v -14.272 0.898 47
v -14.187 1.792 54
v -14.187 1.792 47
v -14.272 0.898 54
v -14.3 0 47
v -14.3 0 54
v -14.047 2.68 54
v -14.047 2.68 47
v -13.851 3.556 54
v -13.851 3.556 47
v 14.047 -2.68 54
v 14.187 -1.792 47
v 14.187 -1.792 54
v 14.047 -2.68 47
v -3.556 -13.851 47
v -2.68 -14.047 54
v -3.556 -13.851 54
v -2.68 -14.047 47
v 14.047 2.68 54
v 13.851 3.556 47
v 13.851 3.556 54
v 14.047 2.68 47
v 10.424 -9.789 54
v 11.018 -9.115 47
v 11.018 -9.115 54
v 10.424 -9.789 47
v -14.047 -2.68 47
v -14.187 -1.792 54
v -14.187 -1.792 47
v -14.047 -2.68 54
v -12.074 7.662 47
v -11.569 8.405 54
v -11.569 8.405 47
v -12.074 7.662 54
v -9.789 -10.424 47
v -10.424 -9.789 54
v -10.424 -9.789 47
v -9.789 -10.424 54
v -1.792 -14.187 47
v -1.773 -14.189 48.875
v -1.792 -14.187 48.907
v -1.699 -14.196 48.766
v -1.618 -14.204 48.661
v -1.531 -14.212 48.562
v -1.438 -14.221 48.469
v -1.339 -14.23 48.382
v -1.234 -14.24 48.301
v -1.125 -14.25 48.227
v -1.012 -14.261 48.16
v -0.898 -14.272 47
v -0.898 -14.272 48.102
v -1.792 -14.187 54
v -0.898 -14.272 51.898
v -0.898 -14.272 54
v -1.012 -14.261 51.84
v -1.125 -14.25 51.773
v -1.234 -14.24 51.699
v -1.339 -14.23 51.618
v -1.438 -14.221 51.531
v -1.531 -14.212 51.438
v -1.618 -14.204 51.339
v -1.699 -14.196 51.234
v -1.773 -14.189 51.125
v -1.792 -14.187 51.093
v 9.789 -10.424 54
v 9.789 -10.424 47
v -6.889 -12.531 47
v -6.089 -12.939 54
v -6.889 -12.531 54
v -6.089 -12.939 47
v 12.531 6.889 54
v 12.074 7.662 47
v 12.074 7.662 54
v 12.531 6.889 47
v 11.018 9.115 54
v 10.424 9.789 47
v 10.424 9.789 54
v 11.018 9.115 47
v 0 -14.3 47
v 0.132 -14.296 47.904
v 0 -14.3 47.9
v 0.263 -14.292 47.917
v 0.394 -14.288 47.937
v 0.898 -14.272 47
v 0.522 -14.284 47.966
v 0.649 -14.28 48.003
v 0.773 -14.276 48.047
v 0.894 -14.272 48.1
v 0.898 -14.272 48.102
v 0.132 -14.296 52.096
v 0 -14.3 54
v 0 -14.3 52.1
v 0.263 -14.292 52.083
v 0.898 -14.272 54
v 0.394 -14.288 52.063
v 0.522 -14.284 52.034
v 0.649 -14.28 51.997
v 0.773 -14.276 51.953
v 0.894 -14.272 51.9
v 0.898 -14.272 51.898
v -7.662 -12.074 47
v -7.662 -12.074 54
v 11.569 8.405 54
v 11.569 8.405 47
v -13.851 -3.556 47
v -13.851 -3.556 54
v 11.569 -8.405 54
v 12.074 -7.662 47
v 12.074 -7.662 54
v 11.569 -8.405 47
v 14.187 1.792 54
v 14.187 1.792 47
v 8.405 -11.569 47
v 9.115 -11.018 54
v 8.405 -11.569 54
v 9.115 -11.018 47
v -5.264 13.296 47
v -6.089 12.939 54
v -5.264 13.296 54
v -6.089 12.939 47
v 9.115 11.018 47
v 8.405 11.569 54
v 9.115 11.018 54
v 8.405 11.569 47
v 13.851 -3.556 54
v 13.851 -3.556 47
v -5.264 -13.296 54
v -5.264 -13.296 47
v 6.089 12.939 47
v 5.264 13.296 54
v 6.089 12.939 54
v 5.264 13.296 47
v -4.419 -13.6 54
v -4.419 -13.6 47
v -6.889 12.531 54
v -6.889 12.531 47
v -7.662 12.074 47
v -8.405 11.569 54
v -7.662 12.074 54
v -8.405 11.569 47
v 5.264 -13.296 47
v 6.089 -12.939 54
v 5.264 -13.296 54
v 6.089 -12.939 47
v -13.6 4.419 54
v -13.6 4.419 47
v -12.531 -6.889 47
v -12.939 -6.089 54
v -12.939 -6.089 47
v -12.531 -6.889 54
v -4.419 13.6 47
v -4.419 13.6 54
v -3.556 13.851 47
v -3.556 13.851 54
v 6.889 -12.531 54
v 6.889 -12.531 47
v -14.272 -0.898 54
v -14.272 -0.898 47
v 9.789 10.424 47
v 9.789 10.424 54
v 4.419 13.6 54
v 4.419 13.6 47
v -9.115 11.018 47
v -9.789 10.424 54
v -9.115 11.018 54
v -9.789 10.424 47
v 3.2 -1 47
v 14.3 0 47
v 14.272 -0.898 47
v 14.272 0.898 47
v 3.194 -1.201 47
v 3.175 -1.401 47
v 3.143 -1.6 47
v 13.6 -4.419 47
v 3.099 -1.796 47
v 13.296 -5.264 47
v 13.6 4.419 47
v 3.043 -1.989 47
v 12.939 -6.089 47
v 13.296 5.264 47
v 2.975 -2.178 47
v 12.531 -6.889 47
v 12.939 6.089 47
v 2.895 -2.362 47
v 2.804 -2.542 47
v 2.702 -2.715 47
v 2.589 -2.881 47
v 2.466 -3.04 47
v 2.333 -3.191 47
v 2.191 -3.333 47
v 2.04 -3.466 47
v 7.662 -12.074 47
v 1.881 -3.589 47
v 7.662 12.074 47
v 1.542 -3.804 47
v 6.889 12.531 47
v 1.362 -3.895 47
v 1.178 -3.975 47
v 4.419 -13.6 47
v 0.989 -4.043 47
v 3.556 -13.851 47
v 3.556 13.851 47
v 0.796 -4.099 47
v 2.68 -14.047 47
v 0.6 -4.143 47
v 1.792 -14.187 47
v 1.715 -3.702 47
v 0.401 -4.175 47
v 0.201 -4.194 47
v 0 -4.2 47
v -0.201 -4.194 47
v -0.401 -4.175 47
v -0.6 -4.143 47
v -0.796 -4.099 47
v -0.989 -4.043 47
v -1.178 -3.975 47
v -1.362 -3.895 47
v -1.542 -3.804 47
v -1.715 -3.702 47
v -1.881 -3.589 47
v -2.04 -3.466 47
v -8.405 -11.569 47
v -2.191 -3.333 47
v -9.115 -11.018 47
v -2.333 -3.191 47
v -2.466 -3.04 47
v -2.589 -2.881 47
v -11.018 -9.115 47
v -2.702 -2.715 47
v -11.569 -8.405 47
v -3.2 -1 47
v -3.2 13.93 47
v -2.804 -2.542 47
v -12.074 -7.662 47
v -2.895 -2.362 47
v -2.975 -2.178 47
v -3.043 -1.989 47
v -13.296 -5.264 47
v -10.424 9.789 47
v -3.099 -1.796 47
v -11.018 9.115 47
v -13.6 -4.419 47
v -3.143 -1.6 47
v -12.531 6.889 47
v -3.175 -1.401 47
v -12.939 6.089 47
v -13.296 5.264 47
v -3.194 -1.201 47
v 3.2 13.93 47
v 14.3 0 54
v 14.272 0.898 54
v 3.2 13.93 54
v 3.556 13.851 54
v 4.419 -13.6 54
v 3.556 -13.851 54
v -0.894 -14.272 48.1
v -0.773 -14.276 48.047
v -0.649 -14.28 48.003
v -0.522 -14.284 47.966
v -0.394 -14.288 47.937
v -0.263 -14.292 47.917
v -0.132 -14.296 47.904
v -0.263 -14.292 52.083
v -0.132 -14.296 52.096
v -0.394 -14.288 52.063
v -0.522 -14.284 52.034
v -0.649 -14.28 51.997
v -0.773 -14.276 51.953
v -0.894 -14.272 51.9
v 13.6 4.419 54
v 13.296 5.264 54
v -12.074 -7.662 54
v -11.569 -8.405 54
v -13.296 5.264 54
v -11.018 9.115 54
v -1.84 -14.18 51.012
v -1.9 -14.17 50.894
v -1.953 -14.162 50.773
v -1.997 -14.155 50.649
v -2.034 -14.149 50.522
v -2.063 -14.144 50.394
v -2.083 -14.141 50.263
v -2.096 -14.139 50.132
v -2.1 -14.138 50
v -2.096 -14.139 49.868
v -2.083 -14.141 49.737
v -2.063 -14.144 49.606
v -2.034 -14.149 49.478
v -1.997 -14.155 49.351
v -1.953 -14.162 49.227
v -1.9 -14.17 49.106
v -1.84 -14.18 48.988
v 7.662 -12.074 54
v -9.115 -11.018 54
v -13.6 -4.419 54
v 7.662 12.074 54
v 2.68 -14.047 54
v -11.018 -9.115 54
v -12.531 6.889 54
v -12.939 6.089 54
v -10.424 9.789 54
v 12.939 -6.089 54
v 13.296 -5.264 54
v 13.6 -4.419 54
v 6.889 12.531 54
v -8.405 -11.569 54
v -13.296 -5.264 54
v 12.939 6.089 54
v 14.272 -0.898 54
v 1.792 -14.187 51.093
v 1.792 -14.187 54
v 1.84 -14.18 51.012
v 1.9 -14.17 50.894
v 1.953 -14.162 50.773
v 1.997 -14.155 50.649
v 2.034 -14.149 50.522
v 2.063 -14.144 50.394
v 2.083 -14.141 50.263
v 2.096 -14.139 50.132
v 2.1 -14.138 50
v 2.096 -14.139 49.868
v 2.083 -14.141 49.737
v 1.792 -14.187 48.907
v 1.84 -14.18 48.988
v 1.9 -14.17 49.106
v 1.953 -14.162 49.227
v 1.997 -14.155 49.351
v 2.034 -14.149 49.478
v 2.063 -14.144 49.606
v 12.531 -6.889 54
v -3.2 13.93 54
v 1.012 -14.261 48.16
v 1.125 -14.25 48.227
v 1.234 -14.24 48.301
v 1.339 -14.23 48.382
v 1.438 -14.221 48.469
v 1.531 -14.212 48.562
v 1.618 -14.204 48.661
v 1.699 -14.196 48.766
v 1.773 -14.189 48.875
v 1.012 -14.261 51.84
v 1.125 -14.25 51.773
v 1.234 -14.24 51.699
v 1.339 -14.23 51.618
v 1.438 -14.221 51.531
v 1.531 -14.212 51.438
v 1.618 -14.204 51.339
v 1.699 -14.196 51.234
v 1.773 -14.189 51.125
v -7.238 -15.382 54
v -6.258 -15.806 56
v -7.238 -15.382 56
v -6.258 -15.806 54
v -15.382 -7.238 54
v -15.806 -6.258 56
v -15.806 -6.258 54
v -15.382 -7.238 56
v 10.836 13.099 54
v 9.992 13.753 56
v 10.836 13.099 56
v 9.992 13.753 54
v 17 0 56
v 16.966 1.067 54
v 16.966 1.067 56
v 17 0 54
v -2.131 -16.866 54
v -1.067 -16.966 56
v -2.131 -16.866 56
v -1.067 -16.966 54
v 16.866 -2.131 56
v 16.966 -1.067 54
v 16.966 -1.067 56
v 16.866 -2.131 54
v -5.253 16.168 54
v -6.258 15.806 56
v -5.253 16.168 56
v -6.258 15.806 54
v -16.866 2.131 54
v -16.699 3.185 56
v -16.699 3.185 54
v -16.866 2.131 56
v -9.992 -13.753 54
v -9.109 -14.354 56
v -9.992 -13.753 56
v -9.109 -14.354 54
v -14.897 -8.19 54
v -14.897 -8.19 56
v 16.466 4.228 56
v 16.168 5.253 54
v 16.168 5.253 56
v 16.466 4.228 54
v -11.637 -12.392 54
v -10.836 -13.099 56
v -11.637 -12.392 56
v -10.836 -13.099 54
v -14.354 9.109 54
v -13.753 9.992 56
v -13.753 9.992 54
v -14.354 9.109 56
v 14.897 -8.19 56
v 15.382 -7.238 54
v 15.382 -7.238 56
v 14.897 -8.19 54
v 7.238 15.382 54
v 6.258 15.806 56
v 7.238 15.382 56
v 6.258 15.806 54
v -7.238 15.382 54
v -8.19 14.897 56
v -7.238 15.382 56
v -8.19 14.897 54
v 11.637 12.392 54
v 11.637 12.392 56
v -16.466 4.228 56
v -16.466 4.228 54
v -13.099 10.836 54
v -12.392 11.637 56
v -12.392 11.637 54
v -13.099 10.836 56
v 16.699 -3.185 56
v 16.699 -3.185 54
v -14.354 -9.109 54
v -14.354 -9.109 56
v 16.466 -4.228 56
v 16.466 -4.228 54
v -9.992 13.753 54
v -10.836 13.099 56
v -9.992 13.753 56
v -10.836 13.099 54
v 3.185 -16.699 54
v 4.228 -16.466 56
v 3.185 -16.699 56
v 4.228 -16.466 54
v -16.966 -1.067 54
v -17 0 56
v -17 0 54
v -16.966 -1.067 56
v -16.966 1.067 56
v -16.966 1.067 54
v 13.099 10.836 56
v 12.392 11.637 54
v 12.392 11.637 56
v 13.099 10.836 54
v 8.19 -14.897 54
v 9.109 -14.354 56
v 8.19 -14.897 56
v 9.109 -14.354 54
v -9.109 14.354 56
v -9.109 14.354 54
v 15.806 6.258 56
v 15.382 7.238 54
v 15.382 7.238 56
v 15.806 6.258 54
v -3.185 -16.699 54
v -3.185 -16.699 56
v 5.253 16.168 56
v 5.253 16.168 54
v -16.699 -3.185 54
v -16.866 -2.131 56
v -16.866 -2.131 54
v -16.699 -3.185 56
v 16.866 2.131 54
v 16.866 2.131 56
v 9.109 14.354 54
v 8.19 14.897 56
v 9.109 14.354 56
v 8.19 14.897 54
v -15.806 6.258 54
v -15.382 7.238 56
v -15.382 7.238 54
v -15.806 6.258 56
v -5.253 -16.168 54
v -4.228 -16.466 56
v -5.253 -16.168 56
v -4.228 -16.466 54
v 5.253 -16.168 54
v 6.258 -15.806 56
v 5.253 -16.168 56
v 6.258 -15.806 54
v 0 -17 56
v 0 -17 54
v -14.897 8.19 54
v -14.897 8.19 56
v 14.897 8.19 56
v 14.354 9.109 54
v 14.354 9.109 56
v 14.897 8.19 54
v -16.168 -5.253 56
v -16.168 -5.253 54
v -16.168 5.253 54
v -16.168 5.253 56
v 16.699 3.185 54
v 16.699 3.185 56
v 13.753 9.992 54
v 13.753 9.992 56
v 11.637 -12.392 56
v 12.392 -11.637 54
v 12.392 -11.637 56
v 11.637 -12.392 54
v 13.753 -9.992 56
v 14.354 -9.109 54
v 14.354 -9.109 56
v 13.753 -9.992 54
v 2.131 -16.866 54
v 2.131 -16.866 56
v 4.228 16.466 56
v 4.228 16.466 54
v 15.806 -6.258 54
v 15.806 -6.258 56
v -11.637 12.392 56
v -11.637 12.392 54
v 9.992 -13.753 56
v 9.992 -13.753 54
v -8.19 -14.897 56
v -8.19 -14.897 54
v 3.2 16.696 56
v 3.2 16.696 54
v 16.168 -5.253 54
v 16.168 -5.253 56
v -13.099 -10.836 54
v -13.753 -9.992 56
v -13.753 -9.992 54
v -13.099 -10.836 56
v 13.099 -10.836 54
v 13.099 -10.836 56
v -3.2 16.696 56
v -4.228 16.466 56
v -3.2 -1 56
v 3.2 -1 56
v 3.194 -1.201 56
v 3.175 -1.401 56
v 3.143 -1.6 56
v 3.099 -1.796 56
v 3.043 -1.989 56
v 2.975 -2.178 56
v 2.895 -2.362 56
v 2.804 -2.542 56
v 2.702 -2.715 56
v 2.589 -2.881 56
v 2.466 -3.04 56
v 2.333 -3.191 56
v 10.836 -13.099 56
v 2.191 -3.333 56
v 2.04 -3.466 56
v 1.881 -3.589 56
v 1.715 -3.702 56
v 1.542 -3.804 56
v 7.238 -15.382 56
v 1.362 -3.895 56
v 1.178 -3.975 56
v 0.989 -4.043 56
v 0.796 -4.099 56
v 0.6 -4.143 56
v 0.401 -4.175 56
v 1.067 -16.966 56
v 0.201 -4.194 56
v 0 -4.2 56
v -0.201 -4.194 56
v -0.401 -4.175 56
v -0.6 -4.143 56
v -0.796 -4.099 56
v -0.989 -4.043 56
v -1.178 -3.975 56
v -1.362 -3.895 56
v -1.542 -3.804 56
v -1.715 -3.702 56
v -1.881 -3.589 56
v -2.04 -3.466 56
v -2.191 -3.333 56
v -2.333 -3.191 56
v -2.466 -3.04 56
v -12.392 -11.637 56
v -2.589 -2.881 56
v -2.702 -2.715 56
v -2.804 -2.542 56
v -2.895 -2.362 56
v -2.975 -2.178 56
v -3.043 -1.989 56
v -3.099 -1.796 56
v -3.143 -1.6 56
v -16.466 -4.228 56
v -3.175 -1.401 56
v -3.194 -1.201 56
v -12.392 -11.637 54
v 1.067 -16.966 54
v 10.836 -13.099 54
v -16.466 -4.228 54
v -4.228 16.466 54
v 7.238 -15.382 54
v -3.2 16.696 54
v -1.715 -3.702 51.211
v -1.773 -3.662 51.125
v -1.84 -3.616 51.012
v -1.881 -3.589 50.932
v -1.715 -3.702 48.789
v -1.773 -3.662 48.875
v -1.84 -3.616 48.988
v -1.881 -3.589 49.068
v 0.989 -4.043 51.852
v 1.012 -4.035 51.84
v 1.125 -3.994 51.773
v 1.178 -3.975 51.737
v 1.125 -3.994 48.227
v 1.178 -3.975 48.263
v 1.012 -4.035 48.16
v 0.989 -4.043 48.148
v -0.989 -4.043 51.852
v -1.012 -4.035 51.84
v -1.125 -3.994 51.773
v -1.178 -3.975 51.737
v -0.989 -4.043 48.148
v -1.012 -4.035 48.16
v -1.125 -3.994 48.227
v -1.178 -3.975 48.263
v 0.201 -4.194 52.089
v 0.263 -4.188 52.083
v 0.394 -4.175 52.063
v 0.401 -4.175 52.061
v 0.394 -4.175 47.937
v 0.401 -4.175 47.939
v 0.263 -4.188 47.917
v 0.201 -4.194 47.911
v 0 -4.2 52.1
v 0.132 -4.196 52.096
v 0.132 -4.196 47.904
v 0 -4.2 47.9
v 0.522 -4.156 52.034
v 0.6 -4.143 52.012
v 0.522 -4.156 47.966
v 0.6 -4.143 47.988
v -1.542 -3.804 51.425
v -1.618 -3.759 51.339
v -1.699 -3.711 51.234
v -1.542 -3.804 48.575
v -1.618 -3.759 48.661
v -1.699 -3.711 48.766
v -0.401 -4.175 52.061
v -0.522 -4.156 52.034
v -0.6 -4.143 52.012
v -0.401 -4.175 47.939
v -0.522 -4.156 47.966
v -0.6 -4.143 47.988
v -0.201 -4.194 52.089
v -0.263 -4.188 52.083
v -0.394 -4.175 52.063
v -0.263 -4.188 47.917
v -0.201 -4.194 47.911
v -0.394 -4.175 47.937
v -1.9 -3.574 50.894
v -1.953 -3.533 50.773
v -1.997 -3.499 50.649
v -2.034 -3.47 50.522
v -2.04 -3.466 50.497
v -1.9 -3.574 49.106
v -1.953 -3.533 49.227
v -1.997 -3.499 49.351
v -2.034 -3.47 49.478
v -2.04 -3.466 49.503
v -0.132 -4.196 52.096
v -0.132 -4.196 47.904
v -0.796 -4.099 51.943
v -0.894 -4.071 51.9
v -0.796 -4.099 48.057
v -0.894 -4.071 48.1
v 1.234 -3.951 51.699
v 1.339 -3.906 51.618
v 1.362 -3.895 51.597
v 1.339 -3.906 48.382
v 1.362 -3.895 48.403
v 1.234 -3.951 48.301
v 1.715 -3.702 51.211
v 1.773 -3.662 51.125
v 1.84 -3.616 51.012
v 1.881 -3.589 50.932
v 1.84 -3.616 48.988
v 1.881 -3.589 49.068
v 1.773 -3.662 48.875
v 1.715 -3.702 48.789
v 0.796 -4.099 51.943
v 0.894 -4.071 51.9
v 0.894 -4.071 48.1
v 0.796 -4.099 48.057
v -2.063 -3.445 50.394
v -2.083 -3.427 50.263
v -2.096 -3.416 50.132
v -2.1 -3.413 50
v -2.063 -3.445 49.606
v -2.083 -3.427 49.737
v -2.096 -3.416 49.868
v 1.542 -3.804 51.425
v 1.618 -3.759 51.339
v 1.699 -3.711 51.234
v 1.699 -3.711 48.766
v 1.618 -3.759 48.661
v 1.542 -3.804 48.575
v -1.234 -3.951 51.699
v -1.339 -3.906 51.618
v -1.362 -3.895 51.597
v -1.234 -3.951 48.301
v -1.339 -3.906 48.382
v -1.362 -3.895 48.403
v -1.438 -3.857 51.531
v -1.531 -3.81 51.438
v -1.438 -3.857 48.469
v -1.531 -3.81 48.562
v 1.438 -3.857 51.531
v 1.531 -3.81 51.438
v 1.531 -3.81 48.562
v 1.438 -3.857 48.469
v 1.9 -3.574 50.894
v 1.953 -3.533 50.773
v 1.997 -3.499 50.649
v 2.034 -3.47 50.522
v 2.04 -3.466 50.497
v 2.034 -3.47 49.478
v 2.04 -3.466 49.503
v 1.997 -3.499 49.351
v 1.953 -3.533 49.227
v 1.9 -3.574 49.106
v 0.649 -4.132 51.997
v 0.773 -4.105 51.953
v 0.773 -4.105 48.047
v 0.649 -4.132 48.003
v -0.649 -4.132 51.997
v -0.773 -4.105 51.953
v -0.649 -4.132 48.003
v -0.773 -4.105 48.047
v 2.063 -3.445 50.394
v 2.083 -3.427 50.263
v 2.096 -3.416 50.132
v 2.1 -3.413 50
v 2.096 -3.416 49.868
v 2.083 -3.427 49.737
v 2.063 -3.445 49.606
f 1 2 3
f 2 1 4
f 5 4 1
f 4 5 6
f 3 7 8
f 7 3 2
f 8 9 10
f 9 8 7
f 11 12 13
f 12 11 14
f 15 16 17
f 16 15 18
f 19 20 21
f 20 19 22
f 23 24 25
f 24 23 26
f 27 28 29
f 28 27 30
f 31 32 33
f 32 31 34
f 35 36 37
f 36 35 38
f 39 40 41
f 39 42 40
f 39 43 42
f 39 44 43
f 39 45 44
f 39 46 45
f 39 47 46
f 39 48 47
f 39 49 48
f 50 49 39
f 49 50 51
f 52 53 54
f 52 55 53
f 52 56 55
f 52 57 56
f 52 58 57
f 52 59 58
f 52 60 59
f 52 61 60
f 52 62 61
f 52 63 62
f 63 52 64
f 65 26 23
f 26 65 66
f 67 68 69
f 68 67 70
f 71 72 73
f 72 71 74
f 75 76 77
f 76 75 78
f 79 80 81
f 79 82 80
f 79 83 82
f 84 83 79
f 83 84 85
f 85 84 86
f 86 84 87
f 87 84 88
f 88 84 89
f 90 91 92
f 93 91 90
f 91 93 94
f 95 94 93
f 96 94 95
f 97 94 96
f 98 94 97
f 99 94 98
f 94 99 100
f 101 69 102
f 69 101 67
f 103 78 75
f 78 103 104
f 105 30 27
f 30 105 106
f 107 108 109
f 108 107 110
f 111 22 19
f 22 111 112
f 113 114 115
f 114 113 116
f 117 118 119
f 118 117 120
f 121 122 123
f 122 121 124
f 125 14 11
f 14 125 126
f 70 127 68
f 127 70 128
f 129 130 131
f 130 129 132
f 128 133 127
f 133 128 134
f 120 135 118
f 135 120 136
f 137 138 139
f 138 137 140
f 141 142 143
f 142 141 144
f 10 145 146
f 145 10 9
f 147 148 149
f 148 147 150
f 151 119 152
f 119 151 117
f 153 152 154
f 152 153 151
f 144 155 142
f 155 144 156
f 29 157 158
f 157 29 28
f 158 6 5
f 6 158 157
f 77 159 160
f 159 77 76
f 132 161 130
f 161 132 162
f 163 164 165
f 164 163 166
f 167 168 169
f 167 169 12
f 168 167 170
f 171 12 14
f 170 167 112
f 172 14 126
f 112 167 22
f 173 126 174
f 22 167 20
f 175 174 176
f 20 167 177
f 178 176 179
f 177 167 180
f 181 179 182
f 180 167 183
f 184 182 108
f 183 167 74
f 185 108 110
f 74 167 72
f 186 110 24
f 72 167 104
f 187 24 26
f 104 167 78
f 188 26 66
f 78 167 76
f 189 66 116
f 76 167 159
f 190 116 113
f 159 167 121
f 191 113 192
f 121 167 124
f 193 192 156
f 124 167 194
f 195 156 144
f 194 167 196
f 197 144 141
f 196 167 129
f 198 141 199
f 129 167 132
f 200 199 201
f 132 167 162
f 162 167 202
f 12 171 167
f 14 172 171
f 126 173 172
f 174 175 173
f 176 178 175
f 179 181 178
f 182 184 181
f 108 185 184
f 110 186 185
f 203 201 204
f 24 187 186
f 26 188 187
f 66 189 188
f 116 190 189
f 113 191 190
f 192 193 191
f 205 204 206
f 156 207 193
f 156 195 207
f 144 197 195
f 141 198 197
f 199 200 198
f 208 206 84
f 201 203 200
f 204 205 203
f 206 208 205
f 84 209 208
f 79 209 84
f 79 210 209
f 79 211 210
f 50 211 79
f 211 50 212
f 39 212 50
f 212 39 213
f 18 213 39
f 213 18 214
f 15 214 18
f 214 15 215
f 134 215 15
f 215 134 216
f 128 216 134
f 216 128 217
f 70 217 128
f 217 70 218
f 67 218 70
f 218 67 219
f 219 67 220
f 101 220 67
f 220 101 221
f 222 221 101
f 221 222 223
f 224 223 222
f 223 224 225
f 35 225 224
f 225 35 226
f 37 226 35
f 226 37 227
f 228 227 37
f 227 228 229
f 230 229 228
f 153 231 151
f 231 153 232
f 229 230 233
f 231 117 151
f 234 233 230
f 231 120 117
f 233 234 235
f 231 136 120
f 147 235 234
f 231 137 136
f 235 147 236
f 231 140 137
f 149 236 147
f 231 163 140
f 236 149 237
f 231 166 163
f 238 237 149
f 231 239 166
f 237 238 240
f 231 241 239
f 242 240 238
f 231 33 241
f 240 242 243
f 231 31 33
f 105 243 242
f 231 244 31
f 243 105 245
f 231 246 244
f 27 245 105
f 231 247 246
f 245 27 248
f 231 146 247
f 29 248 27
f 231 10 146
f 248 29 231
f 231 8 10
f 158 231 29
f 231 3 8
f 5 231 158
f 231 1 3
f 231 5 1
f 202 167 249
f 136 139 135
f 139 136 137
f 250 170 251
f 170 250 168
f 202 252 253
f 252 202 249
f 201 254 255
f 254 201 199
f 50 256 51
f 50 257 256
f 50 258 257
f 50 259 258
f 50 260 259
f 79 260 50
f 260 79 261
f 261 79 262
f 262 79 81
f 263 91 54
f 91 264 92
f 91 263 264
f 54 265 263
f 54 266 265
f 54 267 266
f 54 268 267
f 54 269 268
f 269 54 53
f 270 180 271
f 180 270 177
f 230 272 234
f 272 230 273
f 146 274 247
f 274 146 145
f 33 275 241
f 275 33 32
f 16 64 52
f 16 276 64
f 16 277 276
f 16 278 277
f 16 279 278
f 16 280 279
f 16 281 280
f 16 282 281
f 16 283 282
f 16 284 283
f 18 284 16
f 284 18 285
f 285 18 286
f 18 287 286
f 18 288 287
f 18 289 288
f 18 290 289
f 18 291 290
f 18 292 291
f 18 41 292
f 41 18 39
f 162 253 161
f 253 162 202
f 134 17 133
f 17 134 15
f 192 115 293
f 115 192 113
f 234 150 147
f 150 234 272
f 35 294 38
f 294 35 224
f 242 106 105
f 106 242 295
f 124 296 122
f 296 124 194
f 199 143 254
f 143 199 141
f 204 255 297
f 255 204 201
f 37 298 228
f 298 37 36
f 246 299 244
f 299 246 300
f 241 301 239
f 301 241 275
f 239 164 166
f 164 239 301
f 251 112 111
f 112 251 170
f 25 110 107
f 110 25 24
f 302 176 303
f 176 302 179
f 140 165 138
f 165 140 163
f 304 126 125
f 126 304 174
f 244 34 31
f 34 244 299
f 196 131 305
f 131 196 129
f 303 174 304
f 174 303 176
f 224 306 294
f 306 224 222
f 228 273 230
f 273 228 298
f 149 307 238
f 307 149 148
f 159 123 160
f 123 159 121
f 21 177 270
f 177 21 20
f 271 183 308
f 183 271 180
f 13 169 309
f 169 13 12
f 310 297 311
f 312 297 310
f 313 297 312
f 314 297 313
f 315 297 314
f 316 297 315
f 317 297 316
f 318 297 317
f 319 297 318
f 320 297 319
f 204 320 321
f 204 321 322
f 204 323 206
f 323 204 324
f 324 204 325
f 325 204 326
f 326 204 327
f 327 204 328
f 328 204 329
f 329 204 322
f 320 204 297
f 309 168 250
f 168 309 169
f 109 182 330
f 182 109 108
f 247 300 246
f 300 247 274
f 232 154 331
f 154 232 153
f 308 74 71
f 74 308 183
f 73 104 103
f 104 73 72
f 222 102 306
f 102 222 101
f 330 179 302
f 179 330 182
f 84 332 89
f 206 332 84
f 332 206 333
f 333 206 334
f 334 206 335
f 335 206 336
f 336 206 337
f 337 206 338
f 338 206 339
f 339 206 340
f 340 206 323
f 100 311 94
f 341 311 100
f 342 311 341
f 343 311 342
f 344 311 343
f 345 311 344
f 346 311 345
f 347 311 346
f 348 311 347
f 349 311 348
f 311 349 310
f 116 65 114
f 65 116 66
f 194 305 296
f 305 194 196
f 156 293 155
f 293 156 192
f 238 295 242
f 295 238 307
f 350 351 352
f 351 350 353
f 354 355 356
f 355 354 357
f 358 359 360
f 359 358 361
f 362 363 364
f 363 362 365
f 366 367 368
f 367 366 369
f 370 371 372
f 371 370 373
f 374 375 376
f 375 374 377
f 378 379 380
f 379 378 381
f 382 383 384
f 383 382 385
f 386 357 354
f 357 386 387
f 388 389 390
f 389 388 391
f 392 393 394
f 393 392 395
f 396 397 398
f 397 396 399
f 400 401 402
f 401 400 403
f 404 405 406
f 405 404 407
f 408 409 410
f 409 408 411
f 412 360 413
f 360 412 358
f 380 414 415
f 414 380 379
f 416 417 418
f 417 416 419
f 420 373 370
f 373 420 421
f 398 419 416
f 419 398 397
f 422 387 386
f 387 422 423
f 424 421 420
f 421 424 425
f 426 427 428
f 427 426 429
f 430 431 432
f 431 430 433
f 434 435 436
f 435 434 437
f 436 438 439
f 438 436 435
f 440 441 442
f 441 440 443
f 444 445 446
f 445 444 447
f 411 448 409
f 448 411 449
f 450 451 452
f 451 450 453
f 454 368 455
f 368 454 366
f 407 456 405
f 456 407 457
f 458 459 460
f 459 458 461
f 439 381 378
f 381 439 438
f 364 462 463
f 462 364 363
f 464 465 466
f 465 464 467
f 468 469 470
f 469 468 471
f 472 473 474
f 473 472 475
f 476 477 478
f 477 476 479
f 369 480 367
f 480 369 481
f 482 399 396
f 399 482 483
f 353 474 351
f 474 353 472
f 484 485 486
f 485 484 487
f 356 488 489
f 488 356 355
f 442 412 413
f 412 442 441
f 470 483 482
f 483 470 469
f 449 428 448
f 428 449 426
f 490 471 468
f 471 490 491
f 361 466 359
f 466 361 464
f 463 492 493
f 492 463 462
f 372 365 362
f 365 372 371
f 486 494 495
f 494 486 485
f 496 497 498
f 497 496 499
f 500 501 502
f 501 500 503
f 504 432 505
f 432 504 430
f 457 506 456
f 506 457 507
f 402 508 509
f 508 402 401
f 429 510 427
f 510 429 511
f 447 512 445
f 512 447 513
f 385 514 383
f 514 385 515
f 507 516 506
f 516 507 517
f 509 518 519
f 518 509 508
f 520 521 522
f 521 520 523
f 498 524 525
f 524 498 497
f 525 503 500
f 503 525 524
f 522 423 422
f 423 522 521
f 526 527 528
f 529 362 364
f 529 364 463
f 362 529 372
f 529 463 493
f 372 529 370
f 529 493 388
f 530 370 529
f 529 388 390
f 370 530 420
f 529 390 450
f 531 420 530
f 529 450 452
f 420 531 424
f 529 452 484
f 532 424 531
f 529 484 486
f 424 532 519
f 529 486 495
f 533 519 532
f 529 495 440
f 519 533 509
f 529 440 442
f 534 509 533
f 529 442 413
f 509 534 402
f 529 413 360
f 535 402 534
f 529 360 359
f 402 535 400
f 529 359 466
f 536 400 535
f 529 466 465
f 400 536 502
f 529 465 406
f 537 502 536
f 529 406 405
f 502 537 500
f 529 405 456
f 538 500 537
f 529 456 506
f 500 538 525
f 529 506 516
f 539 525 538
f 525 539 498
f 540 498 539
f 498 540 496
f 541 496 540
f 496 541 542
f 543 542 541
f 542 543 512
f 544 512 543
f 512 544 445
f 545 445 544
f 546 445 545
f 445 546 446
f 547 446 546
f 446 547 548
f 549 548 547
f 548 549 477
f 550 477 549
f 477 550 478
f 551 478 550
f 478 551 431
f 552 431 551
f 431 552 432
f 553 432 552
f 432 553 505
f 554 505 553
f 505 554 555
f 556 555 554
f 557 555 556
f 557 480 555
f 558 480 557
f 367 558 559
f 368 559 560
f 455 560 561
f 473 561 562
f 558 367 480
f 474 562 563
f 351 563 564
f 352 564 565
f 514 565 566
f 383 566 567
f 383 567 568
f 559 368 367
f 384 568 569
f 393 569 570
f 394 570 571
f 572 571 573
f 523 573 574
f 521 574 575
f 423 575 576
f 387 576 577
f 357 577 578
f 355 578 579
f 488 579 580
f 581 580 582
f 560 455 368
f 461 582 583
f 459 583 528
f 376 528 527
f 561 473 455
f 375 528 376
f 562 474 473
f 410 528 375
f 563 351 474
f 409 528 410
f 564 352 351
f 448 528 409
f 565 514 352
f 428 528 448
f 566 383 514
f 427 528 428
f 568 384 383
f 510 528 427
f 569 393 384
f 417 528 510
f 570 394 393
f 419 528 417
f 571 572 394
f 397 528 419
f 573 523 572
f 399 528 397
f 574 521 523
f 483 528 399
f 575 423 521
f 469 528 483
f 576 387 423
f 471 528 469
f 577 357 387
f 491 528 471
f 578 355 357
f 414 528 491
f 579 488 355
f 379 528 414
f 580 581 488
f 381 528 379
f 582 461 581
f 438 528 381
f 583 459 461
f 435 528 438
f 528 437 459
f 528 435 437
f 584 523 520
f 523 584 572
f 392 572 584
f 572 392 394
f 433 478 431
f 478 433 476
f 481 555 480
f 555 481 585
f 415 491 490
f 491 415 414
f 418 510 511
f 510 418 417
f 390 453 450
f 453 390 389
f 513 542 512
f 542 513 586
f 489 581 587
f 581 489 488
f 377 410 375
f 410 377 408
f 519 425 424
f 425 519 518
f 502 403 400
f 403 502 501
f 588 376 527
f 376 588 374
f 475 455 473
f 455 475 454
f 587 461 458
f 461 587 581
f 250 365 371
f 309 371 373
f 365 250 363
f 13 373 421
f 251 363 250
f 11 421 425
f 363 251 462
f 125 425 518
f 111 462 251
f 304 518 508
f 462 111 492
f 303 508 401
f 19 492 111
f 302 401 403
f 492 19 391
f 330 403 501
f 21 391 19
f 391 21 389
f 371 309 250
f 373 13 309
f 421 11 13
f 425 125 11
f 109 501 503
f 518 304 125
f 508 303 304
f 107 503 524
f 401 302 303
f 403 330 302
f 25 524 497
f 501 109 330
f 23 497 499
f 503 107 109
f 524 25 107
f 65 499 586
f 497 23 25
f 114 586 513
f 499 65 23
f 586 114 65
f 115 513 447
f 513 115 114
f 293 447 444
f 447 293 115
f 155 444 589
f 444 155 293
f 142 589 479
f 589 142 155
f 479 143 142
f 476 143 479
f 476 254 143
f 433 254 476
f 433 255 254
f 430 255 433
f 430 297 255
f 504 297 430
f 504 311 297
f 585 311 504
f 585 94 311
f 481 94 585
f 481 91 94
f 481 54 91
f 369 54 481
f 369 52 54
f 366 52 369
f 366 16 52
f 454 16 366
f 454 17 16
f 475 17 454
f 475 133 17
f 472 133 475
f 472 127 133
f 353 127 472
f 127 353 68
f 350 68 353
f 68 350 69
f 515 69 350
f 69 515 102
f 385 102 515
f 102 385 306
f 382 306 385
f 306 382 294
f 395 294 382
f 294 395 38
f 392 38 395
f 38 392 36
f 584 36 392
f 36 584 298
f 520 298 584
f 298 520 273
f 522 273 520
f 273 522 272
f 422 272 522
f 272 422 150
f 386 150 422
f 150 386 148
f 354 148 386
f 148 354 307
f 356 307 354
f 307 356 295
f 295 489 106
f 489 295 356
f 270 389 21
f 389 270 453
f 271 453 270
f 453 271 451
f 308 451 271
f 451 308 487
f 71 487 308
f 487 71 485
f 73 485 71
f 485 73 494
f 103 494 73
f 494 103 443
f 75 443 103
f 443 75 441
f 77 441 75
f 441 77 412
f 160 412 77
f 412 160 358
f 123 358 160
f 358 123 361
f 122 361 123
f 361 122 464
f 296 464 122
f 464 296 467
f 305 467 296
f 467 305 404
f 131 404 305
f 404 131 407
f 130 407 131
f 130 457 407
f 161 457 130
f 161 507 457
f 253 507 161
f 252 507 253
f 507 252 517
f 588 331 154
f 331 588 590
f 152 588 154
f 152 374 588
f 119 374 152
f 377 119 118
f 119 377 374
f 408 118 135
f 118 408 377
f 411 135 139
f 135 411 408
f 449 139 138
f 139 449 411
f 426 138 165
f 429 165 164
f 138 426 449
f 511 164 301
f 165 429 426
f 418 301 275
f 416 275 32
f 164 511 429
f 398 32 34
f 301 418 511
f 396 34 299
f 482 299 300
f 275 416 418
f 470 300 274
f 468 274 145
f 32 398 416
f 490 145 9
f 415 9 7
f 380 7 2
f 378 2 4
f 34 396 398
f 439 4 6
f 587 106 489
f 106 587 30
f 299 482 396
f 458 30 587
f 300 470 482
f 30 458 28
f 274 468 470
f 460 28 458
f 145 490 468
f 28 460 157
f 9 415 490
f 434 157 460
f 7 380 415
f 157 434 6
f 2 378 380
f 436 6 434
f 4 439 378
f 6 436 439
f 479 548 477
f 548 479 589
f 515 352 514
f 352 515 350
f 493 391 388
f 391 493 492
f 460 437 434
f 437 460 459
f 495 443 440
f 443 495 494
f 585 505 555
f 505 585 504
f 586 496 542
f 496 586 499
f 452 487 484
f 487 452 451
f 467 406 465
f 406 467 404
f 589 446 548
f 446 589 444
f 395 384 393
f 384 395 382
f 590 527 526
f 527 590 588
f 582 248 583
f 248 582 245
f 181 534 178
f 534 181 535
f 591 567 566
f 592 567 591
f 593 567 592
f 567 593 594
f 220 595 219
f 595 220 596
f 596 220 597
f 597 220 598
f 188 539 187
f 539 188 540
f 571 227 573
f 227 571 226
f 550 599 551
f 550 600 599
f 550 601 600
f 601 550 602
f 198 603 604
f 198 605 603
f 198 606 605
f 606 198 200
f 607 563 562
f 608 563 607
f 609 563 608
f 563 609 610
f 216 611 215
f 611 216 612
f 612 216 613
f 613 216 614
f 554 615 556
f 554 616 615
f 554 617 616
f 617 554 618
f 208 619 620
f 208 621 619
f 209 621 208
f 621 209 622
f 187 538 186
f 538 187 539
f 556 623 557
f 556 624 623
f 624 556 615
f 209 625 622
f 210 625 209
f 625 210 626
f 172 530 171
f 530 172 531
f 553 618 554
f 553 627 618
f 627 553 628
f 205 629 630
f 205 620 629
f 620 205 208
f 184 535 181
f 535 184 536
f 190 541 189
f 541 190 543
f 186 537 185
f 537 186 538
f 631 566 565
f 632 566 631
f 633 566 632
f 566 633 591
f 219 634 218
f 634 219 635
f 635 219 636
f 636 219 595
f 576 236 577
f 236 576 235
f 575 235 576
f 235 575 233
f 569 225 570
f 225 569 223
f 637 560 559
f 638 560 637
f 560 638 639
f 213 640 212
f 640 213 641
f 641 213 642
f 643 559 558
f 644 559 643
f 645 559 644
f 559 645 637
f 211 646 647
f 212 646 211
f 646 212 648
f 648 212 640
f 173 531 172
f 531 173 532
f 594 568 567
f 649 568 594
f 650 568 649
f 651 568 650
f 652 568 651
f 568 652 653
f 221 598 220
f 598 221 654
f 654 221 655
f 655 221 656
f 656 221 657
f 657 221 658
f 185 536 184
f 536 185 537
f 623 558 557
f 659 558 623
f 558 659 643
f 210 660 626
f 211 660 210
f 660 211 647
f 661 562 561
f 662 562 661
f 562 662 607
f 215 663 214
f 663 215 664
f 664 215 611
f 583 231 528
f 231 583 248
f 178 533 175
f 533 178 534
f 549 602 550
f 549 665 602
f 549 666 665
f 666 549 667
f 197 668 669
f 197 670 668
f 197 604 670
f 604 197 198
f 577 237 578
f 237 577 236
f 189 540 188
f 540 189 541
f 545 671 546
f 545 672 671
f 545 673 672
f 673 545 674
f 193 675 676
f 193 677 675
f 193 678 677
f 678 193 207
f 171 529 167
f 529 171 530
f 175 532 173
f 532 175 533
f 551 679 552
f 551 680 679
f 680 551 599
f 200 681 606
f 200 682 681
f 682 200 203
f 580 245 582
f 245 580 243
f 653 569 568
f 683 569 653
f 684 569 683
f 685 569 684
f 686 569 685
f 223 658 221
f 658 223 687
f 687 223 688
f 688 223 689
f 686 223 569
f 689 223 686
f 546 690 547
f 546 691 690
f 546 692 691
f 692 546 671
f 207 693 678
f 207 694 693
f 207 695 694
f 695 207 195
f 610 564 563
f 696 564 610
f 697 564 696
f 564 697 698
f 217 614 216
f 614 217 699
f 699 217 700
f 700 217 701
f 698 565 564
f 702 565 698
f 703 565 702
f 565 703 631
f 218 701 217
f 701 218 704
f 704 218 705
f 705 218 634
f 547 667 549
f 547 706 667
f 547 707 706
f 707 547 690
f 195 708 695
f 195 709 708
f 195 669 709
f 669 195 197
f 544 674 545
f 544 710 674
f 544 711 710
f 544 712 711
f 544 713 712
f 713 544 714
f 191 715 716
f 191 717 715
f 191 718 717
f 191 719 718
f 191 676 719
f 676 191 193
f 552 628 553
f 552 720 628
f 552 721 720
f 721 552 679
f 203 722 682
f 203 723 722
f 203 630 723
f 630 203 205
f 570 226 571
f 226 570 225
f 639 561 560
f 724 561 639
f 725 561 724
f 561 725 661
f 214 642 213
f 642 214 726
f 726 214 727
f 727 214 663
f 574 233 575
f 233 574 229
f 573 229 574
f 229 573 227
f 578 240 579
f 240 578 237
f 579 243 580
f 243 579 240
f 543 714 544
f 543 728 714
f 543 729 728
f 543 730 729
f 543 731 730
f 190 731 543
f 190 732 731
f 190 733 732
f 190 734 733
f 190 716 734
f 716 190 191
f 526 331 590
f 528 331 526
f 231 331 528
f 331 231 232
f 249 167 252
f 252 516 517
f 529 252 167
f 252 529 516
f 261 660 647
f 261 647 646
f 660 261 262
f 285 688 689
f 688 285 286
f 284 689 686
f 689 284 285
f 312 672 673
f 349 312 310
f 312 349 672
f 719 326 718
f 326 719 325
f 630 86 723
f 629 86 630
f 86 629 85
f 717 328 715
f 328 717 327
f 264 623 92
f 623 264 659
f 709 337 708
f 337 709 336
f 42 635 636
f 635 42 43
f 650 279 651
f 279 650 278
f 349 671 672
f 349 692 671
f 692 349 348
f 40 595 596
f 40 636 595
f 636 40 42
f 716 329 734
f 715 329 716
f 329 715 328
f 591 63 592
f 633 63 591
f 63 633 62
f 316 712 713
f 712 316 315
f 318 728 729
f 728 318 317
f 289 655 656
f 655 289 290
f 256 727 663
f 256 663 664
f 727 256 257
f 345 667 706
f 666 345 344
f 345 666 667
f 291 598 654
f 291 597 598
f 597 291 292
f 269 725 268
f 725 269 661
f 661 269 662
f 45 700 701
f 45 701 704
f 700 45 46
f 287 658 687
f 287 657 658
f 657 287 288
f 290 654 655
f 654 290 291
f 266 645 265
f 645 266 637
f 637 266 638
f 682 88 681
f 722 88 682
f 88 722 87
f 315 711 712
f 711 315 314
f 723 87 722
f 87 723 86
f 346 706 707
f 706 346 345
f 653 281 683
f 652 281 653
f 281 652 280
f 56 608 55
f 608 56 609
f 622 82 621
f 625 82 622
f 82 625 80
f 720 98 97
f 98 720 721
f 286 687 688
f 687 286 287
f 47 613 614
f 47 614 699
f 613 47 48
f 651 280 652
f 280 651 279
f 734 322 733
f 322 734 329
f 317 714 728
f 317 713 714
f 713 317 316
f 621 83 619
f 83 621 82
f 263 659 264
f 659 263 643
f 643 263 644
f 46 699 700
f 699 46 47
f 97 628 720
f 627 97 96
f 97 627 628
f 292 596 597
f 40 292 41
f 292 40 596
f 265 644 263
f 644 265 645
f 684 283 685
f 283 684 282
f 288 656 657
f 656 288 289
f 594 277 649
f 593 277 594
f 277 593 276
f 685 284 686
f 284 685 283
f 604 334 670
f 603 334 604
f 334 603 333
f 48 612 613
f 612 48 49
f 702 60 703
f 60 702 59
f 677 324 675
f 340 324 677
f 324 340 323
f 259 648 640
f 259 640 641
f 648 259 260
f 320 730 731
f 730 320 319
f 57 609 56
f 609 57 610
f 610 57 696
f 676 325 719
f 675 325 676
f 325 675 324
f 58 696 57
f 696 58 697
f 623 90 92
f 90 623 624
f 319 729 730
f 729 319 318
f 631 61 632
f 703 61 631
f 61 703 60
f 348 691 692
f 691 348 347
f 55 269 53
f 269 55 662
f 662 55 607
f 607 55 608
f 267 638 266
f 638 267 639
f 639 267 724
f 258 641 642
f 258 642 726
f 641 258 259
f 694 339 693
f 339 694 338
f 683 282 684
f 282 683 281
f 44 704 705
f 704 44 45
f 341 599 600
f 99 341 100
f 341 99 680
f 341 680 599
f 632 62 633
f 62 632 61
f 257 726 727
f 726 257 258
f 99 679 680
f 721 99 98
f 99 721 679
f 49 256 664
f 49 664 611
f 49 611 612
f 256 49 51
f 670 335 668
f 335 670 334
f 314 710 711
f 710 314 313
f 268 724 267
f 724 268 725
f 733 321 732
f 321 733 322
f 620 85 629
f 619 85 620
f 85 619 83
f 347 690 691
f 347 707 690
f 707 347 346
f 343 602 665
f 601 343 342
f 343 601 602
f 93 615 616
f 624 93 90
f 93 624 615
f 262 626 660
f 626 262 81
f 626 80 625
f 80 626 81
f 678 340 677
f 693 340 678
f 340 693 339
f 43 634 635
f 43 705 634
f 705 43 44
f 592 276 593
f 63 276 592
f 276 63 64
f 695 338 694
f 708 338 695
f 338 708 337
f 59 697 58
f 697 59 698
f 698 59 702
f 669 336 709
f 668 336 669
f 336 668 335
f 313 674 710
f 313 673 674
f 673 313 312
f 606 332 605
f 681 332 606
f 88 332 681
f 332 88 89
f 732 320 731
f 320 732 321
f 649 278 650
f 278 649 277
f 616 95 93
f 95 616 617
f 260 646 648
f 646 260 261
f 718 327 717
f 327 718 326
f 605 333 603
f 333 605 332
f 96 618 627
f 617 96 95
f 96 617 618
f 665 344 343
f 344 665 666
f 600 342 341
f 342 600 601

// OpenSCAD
$fn=100;
!rotate([180,0,180]) translate([0,0,-55]) color("blue") cover();
innerR=15;
difference(){
	cylinder(r=18, h=110, center=true);
	cylinder(r=innerR, h=111, center=true);
	ventHole();
	translate([0,0,25]) ventHole();
	translate([0,0,-25]) ventHole();
	translate([-15,0,-20])cube([10,3,80], center=true ); // later cut 
	translate([0,-15,-20])cube([8,10,80], center=true ); // top cut head end
	translate([0,-13,63])cube([4,10,30], center=true ); // top cut tail end
	translate([-4,-14,50])  rotate([90,225,0]) slit(); // tail end screw slit
	slit2();
	translate([0,0,12]) slit2();
	translate([0,0,-12]) slit2();
	translate([0,0,-24]) slit2();
	translate([0,0,-36]) slit2();
	translate([0,0,-48]) slit2();

}

module ventHole() {
	rotate([0,90,0])translate([0,0,20]) cylinder (r=3, h=40, center=true);
}

module slit2() {
	translate([-13,3,0])rotate([0,90,0]) slit();
	}

module slit(){
	cylinder(r=1.9, h=10, center=true);
	rotate([0,0,135]) translate([0,2,0]) cube([4,4,10], center=true);
}

module cover(){
	h2=8;
	difference(){
		union(){
		translate([0,0,h2/2])	cylinder(r=innerR-.7, h=h2, center=true);
		cylinder(r=17, h=2, center=true);
		}
		translate([0,-1,0]) rotate([0,0,90]) cylinder(r=3.2, h=25, center=true);
		translate([0,14,0]) cube([6.4,30,17], center=true ); // verticl cut 
		rotate([90,0,0]) translate([0,5,0]) cylinder(r=2.1,h=20); //screw small =1.8, large=2.1
		//translate([0,-9,0]) cube ([6,3,9], center=true) ; //hex nut
	}
}


//translate([0,0,-50]) color("red") nosecone();
module nosecone() {
	difference (){
		cylinder(r=innerR-0.5, h=38);
		translate([0,0,-.1])cylinder(r2=innerR-1, r1=5, h=39);
		rotate([90,0,-90]) translate([0,3,4]) cylinder(r=2.1,h=18); //screw
		translate([0,-7,26])cube([8,16,25], center=true ); // top cut head end
		}
}


//!cover2(); // models the original cover	
module cover2(){
	difference(){
		union(){
			difference(){
				cylinder(r=18.5, h=2, center=true);
				translate([0,-15,0])cube([40,20,2], center=true);
			}
			h2=7; translate([0,0,h2/2-1])	cylinder(r=15, h=h2, center=true);

		}
		translate([0,10,0]) rotate([0,0,90]) cylinder(r=4, h=25, center=true);
		translate([0,14,0]) cube([8,10,17], center=true ); // verticl cut 
		rotate([90,0,0]) translate([0,3,6]) cylinder(r=1.4,h=10); //screw
		rotate([0,90,0]) translate([-6,-6,0]) cylinder(r=4,h=50, center=true); // horizontal groove
		translate([0,4,4])cube([40,25,4], center=true);
	}
}
